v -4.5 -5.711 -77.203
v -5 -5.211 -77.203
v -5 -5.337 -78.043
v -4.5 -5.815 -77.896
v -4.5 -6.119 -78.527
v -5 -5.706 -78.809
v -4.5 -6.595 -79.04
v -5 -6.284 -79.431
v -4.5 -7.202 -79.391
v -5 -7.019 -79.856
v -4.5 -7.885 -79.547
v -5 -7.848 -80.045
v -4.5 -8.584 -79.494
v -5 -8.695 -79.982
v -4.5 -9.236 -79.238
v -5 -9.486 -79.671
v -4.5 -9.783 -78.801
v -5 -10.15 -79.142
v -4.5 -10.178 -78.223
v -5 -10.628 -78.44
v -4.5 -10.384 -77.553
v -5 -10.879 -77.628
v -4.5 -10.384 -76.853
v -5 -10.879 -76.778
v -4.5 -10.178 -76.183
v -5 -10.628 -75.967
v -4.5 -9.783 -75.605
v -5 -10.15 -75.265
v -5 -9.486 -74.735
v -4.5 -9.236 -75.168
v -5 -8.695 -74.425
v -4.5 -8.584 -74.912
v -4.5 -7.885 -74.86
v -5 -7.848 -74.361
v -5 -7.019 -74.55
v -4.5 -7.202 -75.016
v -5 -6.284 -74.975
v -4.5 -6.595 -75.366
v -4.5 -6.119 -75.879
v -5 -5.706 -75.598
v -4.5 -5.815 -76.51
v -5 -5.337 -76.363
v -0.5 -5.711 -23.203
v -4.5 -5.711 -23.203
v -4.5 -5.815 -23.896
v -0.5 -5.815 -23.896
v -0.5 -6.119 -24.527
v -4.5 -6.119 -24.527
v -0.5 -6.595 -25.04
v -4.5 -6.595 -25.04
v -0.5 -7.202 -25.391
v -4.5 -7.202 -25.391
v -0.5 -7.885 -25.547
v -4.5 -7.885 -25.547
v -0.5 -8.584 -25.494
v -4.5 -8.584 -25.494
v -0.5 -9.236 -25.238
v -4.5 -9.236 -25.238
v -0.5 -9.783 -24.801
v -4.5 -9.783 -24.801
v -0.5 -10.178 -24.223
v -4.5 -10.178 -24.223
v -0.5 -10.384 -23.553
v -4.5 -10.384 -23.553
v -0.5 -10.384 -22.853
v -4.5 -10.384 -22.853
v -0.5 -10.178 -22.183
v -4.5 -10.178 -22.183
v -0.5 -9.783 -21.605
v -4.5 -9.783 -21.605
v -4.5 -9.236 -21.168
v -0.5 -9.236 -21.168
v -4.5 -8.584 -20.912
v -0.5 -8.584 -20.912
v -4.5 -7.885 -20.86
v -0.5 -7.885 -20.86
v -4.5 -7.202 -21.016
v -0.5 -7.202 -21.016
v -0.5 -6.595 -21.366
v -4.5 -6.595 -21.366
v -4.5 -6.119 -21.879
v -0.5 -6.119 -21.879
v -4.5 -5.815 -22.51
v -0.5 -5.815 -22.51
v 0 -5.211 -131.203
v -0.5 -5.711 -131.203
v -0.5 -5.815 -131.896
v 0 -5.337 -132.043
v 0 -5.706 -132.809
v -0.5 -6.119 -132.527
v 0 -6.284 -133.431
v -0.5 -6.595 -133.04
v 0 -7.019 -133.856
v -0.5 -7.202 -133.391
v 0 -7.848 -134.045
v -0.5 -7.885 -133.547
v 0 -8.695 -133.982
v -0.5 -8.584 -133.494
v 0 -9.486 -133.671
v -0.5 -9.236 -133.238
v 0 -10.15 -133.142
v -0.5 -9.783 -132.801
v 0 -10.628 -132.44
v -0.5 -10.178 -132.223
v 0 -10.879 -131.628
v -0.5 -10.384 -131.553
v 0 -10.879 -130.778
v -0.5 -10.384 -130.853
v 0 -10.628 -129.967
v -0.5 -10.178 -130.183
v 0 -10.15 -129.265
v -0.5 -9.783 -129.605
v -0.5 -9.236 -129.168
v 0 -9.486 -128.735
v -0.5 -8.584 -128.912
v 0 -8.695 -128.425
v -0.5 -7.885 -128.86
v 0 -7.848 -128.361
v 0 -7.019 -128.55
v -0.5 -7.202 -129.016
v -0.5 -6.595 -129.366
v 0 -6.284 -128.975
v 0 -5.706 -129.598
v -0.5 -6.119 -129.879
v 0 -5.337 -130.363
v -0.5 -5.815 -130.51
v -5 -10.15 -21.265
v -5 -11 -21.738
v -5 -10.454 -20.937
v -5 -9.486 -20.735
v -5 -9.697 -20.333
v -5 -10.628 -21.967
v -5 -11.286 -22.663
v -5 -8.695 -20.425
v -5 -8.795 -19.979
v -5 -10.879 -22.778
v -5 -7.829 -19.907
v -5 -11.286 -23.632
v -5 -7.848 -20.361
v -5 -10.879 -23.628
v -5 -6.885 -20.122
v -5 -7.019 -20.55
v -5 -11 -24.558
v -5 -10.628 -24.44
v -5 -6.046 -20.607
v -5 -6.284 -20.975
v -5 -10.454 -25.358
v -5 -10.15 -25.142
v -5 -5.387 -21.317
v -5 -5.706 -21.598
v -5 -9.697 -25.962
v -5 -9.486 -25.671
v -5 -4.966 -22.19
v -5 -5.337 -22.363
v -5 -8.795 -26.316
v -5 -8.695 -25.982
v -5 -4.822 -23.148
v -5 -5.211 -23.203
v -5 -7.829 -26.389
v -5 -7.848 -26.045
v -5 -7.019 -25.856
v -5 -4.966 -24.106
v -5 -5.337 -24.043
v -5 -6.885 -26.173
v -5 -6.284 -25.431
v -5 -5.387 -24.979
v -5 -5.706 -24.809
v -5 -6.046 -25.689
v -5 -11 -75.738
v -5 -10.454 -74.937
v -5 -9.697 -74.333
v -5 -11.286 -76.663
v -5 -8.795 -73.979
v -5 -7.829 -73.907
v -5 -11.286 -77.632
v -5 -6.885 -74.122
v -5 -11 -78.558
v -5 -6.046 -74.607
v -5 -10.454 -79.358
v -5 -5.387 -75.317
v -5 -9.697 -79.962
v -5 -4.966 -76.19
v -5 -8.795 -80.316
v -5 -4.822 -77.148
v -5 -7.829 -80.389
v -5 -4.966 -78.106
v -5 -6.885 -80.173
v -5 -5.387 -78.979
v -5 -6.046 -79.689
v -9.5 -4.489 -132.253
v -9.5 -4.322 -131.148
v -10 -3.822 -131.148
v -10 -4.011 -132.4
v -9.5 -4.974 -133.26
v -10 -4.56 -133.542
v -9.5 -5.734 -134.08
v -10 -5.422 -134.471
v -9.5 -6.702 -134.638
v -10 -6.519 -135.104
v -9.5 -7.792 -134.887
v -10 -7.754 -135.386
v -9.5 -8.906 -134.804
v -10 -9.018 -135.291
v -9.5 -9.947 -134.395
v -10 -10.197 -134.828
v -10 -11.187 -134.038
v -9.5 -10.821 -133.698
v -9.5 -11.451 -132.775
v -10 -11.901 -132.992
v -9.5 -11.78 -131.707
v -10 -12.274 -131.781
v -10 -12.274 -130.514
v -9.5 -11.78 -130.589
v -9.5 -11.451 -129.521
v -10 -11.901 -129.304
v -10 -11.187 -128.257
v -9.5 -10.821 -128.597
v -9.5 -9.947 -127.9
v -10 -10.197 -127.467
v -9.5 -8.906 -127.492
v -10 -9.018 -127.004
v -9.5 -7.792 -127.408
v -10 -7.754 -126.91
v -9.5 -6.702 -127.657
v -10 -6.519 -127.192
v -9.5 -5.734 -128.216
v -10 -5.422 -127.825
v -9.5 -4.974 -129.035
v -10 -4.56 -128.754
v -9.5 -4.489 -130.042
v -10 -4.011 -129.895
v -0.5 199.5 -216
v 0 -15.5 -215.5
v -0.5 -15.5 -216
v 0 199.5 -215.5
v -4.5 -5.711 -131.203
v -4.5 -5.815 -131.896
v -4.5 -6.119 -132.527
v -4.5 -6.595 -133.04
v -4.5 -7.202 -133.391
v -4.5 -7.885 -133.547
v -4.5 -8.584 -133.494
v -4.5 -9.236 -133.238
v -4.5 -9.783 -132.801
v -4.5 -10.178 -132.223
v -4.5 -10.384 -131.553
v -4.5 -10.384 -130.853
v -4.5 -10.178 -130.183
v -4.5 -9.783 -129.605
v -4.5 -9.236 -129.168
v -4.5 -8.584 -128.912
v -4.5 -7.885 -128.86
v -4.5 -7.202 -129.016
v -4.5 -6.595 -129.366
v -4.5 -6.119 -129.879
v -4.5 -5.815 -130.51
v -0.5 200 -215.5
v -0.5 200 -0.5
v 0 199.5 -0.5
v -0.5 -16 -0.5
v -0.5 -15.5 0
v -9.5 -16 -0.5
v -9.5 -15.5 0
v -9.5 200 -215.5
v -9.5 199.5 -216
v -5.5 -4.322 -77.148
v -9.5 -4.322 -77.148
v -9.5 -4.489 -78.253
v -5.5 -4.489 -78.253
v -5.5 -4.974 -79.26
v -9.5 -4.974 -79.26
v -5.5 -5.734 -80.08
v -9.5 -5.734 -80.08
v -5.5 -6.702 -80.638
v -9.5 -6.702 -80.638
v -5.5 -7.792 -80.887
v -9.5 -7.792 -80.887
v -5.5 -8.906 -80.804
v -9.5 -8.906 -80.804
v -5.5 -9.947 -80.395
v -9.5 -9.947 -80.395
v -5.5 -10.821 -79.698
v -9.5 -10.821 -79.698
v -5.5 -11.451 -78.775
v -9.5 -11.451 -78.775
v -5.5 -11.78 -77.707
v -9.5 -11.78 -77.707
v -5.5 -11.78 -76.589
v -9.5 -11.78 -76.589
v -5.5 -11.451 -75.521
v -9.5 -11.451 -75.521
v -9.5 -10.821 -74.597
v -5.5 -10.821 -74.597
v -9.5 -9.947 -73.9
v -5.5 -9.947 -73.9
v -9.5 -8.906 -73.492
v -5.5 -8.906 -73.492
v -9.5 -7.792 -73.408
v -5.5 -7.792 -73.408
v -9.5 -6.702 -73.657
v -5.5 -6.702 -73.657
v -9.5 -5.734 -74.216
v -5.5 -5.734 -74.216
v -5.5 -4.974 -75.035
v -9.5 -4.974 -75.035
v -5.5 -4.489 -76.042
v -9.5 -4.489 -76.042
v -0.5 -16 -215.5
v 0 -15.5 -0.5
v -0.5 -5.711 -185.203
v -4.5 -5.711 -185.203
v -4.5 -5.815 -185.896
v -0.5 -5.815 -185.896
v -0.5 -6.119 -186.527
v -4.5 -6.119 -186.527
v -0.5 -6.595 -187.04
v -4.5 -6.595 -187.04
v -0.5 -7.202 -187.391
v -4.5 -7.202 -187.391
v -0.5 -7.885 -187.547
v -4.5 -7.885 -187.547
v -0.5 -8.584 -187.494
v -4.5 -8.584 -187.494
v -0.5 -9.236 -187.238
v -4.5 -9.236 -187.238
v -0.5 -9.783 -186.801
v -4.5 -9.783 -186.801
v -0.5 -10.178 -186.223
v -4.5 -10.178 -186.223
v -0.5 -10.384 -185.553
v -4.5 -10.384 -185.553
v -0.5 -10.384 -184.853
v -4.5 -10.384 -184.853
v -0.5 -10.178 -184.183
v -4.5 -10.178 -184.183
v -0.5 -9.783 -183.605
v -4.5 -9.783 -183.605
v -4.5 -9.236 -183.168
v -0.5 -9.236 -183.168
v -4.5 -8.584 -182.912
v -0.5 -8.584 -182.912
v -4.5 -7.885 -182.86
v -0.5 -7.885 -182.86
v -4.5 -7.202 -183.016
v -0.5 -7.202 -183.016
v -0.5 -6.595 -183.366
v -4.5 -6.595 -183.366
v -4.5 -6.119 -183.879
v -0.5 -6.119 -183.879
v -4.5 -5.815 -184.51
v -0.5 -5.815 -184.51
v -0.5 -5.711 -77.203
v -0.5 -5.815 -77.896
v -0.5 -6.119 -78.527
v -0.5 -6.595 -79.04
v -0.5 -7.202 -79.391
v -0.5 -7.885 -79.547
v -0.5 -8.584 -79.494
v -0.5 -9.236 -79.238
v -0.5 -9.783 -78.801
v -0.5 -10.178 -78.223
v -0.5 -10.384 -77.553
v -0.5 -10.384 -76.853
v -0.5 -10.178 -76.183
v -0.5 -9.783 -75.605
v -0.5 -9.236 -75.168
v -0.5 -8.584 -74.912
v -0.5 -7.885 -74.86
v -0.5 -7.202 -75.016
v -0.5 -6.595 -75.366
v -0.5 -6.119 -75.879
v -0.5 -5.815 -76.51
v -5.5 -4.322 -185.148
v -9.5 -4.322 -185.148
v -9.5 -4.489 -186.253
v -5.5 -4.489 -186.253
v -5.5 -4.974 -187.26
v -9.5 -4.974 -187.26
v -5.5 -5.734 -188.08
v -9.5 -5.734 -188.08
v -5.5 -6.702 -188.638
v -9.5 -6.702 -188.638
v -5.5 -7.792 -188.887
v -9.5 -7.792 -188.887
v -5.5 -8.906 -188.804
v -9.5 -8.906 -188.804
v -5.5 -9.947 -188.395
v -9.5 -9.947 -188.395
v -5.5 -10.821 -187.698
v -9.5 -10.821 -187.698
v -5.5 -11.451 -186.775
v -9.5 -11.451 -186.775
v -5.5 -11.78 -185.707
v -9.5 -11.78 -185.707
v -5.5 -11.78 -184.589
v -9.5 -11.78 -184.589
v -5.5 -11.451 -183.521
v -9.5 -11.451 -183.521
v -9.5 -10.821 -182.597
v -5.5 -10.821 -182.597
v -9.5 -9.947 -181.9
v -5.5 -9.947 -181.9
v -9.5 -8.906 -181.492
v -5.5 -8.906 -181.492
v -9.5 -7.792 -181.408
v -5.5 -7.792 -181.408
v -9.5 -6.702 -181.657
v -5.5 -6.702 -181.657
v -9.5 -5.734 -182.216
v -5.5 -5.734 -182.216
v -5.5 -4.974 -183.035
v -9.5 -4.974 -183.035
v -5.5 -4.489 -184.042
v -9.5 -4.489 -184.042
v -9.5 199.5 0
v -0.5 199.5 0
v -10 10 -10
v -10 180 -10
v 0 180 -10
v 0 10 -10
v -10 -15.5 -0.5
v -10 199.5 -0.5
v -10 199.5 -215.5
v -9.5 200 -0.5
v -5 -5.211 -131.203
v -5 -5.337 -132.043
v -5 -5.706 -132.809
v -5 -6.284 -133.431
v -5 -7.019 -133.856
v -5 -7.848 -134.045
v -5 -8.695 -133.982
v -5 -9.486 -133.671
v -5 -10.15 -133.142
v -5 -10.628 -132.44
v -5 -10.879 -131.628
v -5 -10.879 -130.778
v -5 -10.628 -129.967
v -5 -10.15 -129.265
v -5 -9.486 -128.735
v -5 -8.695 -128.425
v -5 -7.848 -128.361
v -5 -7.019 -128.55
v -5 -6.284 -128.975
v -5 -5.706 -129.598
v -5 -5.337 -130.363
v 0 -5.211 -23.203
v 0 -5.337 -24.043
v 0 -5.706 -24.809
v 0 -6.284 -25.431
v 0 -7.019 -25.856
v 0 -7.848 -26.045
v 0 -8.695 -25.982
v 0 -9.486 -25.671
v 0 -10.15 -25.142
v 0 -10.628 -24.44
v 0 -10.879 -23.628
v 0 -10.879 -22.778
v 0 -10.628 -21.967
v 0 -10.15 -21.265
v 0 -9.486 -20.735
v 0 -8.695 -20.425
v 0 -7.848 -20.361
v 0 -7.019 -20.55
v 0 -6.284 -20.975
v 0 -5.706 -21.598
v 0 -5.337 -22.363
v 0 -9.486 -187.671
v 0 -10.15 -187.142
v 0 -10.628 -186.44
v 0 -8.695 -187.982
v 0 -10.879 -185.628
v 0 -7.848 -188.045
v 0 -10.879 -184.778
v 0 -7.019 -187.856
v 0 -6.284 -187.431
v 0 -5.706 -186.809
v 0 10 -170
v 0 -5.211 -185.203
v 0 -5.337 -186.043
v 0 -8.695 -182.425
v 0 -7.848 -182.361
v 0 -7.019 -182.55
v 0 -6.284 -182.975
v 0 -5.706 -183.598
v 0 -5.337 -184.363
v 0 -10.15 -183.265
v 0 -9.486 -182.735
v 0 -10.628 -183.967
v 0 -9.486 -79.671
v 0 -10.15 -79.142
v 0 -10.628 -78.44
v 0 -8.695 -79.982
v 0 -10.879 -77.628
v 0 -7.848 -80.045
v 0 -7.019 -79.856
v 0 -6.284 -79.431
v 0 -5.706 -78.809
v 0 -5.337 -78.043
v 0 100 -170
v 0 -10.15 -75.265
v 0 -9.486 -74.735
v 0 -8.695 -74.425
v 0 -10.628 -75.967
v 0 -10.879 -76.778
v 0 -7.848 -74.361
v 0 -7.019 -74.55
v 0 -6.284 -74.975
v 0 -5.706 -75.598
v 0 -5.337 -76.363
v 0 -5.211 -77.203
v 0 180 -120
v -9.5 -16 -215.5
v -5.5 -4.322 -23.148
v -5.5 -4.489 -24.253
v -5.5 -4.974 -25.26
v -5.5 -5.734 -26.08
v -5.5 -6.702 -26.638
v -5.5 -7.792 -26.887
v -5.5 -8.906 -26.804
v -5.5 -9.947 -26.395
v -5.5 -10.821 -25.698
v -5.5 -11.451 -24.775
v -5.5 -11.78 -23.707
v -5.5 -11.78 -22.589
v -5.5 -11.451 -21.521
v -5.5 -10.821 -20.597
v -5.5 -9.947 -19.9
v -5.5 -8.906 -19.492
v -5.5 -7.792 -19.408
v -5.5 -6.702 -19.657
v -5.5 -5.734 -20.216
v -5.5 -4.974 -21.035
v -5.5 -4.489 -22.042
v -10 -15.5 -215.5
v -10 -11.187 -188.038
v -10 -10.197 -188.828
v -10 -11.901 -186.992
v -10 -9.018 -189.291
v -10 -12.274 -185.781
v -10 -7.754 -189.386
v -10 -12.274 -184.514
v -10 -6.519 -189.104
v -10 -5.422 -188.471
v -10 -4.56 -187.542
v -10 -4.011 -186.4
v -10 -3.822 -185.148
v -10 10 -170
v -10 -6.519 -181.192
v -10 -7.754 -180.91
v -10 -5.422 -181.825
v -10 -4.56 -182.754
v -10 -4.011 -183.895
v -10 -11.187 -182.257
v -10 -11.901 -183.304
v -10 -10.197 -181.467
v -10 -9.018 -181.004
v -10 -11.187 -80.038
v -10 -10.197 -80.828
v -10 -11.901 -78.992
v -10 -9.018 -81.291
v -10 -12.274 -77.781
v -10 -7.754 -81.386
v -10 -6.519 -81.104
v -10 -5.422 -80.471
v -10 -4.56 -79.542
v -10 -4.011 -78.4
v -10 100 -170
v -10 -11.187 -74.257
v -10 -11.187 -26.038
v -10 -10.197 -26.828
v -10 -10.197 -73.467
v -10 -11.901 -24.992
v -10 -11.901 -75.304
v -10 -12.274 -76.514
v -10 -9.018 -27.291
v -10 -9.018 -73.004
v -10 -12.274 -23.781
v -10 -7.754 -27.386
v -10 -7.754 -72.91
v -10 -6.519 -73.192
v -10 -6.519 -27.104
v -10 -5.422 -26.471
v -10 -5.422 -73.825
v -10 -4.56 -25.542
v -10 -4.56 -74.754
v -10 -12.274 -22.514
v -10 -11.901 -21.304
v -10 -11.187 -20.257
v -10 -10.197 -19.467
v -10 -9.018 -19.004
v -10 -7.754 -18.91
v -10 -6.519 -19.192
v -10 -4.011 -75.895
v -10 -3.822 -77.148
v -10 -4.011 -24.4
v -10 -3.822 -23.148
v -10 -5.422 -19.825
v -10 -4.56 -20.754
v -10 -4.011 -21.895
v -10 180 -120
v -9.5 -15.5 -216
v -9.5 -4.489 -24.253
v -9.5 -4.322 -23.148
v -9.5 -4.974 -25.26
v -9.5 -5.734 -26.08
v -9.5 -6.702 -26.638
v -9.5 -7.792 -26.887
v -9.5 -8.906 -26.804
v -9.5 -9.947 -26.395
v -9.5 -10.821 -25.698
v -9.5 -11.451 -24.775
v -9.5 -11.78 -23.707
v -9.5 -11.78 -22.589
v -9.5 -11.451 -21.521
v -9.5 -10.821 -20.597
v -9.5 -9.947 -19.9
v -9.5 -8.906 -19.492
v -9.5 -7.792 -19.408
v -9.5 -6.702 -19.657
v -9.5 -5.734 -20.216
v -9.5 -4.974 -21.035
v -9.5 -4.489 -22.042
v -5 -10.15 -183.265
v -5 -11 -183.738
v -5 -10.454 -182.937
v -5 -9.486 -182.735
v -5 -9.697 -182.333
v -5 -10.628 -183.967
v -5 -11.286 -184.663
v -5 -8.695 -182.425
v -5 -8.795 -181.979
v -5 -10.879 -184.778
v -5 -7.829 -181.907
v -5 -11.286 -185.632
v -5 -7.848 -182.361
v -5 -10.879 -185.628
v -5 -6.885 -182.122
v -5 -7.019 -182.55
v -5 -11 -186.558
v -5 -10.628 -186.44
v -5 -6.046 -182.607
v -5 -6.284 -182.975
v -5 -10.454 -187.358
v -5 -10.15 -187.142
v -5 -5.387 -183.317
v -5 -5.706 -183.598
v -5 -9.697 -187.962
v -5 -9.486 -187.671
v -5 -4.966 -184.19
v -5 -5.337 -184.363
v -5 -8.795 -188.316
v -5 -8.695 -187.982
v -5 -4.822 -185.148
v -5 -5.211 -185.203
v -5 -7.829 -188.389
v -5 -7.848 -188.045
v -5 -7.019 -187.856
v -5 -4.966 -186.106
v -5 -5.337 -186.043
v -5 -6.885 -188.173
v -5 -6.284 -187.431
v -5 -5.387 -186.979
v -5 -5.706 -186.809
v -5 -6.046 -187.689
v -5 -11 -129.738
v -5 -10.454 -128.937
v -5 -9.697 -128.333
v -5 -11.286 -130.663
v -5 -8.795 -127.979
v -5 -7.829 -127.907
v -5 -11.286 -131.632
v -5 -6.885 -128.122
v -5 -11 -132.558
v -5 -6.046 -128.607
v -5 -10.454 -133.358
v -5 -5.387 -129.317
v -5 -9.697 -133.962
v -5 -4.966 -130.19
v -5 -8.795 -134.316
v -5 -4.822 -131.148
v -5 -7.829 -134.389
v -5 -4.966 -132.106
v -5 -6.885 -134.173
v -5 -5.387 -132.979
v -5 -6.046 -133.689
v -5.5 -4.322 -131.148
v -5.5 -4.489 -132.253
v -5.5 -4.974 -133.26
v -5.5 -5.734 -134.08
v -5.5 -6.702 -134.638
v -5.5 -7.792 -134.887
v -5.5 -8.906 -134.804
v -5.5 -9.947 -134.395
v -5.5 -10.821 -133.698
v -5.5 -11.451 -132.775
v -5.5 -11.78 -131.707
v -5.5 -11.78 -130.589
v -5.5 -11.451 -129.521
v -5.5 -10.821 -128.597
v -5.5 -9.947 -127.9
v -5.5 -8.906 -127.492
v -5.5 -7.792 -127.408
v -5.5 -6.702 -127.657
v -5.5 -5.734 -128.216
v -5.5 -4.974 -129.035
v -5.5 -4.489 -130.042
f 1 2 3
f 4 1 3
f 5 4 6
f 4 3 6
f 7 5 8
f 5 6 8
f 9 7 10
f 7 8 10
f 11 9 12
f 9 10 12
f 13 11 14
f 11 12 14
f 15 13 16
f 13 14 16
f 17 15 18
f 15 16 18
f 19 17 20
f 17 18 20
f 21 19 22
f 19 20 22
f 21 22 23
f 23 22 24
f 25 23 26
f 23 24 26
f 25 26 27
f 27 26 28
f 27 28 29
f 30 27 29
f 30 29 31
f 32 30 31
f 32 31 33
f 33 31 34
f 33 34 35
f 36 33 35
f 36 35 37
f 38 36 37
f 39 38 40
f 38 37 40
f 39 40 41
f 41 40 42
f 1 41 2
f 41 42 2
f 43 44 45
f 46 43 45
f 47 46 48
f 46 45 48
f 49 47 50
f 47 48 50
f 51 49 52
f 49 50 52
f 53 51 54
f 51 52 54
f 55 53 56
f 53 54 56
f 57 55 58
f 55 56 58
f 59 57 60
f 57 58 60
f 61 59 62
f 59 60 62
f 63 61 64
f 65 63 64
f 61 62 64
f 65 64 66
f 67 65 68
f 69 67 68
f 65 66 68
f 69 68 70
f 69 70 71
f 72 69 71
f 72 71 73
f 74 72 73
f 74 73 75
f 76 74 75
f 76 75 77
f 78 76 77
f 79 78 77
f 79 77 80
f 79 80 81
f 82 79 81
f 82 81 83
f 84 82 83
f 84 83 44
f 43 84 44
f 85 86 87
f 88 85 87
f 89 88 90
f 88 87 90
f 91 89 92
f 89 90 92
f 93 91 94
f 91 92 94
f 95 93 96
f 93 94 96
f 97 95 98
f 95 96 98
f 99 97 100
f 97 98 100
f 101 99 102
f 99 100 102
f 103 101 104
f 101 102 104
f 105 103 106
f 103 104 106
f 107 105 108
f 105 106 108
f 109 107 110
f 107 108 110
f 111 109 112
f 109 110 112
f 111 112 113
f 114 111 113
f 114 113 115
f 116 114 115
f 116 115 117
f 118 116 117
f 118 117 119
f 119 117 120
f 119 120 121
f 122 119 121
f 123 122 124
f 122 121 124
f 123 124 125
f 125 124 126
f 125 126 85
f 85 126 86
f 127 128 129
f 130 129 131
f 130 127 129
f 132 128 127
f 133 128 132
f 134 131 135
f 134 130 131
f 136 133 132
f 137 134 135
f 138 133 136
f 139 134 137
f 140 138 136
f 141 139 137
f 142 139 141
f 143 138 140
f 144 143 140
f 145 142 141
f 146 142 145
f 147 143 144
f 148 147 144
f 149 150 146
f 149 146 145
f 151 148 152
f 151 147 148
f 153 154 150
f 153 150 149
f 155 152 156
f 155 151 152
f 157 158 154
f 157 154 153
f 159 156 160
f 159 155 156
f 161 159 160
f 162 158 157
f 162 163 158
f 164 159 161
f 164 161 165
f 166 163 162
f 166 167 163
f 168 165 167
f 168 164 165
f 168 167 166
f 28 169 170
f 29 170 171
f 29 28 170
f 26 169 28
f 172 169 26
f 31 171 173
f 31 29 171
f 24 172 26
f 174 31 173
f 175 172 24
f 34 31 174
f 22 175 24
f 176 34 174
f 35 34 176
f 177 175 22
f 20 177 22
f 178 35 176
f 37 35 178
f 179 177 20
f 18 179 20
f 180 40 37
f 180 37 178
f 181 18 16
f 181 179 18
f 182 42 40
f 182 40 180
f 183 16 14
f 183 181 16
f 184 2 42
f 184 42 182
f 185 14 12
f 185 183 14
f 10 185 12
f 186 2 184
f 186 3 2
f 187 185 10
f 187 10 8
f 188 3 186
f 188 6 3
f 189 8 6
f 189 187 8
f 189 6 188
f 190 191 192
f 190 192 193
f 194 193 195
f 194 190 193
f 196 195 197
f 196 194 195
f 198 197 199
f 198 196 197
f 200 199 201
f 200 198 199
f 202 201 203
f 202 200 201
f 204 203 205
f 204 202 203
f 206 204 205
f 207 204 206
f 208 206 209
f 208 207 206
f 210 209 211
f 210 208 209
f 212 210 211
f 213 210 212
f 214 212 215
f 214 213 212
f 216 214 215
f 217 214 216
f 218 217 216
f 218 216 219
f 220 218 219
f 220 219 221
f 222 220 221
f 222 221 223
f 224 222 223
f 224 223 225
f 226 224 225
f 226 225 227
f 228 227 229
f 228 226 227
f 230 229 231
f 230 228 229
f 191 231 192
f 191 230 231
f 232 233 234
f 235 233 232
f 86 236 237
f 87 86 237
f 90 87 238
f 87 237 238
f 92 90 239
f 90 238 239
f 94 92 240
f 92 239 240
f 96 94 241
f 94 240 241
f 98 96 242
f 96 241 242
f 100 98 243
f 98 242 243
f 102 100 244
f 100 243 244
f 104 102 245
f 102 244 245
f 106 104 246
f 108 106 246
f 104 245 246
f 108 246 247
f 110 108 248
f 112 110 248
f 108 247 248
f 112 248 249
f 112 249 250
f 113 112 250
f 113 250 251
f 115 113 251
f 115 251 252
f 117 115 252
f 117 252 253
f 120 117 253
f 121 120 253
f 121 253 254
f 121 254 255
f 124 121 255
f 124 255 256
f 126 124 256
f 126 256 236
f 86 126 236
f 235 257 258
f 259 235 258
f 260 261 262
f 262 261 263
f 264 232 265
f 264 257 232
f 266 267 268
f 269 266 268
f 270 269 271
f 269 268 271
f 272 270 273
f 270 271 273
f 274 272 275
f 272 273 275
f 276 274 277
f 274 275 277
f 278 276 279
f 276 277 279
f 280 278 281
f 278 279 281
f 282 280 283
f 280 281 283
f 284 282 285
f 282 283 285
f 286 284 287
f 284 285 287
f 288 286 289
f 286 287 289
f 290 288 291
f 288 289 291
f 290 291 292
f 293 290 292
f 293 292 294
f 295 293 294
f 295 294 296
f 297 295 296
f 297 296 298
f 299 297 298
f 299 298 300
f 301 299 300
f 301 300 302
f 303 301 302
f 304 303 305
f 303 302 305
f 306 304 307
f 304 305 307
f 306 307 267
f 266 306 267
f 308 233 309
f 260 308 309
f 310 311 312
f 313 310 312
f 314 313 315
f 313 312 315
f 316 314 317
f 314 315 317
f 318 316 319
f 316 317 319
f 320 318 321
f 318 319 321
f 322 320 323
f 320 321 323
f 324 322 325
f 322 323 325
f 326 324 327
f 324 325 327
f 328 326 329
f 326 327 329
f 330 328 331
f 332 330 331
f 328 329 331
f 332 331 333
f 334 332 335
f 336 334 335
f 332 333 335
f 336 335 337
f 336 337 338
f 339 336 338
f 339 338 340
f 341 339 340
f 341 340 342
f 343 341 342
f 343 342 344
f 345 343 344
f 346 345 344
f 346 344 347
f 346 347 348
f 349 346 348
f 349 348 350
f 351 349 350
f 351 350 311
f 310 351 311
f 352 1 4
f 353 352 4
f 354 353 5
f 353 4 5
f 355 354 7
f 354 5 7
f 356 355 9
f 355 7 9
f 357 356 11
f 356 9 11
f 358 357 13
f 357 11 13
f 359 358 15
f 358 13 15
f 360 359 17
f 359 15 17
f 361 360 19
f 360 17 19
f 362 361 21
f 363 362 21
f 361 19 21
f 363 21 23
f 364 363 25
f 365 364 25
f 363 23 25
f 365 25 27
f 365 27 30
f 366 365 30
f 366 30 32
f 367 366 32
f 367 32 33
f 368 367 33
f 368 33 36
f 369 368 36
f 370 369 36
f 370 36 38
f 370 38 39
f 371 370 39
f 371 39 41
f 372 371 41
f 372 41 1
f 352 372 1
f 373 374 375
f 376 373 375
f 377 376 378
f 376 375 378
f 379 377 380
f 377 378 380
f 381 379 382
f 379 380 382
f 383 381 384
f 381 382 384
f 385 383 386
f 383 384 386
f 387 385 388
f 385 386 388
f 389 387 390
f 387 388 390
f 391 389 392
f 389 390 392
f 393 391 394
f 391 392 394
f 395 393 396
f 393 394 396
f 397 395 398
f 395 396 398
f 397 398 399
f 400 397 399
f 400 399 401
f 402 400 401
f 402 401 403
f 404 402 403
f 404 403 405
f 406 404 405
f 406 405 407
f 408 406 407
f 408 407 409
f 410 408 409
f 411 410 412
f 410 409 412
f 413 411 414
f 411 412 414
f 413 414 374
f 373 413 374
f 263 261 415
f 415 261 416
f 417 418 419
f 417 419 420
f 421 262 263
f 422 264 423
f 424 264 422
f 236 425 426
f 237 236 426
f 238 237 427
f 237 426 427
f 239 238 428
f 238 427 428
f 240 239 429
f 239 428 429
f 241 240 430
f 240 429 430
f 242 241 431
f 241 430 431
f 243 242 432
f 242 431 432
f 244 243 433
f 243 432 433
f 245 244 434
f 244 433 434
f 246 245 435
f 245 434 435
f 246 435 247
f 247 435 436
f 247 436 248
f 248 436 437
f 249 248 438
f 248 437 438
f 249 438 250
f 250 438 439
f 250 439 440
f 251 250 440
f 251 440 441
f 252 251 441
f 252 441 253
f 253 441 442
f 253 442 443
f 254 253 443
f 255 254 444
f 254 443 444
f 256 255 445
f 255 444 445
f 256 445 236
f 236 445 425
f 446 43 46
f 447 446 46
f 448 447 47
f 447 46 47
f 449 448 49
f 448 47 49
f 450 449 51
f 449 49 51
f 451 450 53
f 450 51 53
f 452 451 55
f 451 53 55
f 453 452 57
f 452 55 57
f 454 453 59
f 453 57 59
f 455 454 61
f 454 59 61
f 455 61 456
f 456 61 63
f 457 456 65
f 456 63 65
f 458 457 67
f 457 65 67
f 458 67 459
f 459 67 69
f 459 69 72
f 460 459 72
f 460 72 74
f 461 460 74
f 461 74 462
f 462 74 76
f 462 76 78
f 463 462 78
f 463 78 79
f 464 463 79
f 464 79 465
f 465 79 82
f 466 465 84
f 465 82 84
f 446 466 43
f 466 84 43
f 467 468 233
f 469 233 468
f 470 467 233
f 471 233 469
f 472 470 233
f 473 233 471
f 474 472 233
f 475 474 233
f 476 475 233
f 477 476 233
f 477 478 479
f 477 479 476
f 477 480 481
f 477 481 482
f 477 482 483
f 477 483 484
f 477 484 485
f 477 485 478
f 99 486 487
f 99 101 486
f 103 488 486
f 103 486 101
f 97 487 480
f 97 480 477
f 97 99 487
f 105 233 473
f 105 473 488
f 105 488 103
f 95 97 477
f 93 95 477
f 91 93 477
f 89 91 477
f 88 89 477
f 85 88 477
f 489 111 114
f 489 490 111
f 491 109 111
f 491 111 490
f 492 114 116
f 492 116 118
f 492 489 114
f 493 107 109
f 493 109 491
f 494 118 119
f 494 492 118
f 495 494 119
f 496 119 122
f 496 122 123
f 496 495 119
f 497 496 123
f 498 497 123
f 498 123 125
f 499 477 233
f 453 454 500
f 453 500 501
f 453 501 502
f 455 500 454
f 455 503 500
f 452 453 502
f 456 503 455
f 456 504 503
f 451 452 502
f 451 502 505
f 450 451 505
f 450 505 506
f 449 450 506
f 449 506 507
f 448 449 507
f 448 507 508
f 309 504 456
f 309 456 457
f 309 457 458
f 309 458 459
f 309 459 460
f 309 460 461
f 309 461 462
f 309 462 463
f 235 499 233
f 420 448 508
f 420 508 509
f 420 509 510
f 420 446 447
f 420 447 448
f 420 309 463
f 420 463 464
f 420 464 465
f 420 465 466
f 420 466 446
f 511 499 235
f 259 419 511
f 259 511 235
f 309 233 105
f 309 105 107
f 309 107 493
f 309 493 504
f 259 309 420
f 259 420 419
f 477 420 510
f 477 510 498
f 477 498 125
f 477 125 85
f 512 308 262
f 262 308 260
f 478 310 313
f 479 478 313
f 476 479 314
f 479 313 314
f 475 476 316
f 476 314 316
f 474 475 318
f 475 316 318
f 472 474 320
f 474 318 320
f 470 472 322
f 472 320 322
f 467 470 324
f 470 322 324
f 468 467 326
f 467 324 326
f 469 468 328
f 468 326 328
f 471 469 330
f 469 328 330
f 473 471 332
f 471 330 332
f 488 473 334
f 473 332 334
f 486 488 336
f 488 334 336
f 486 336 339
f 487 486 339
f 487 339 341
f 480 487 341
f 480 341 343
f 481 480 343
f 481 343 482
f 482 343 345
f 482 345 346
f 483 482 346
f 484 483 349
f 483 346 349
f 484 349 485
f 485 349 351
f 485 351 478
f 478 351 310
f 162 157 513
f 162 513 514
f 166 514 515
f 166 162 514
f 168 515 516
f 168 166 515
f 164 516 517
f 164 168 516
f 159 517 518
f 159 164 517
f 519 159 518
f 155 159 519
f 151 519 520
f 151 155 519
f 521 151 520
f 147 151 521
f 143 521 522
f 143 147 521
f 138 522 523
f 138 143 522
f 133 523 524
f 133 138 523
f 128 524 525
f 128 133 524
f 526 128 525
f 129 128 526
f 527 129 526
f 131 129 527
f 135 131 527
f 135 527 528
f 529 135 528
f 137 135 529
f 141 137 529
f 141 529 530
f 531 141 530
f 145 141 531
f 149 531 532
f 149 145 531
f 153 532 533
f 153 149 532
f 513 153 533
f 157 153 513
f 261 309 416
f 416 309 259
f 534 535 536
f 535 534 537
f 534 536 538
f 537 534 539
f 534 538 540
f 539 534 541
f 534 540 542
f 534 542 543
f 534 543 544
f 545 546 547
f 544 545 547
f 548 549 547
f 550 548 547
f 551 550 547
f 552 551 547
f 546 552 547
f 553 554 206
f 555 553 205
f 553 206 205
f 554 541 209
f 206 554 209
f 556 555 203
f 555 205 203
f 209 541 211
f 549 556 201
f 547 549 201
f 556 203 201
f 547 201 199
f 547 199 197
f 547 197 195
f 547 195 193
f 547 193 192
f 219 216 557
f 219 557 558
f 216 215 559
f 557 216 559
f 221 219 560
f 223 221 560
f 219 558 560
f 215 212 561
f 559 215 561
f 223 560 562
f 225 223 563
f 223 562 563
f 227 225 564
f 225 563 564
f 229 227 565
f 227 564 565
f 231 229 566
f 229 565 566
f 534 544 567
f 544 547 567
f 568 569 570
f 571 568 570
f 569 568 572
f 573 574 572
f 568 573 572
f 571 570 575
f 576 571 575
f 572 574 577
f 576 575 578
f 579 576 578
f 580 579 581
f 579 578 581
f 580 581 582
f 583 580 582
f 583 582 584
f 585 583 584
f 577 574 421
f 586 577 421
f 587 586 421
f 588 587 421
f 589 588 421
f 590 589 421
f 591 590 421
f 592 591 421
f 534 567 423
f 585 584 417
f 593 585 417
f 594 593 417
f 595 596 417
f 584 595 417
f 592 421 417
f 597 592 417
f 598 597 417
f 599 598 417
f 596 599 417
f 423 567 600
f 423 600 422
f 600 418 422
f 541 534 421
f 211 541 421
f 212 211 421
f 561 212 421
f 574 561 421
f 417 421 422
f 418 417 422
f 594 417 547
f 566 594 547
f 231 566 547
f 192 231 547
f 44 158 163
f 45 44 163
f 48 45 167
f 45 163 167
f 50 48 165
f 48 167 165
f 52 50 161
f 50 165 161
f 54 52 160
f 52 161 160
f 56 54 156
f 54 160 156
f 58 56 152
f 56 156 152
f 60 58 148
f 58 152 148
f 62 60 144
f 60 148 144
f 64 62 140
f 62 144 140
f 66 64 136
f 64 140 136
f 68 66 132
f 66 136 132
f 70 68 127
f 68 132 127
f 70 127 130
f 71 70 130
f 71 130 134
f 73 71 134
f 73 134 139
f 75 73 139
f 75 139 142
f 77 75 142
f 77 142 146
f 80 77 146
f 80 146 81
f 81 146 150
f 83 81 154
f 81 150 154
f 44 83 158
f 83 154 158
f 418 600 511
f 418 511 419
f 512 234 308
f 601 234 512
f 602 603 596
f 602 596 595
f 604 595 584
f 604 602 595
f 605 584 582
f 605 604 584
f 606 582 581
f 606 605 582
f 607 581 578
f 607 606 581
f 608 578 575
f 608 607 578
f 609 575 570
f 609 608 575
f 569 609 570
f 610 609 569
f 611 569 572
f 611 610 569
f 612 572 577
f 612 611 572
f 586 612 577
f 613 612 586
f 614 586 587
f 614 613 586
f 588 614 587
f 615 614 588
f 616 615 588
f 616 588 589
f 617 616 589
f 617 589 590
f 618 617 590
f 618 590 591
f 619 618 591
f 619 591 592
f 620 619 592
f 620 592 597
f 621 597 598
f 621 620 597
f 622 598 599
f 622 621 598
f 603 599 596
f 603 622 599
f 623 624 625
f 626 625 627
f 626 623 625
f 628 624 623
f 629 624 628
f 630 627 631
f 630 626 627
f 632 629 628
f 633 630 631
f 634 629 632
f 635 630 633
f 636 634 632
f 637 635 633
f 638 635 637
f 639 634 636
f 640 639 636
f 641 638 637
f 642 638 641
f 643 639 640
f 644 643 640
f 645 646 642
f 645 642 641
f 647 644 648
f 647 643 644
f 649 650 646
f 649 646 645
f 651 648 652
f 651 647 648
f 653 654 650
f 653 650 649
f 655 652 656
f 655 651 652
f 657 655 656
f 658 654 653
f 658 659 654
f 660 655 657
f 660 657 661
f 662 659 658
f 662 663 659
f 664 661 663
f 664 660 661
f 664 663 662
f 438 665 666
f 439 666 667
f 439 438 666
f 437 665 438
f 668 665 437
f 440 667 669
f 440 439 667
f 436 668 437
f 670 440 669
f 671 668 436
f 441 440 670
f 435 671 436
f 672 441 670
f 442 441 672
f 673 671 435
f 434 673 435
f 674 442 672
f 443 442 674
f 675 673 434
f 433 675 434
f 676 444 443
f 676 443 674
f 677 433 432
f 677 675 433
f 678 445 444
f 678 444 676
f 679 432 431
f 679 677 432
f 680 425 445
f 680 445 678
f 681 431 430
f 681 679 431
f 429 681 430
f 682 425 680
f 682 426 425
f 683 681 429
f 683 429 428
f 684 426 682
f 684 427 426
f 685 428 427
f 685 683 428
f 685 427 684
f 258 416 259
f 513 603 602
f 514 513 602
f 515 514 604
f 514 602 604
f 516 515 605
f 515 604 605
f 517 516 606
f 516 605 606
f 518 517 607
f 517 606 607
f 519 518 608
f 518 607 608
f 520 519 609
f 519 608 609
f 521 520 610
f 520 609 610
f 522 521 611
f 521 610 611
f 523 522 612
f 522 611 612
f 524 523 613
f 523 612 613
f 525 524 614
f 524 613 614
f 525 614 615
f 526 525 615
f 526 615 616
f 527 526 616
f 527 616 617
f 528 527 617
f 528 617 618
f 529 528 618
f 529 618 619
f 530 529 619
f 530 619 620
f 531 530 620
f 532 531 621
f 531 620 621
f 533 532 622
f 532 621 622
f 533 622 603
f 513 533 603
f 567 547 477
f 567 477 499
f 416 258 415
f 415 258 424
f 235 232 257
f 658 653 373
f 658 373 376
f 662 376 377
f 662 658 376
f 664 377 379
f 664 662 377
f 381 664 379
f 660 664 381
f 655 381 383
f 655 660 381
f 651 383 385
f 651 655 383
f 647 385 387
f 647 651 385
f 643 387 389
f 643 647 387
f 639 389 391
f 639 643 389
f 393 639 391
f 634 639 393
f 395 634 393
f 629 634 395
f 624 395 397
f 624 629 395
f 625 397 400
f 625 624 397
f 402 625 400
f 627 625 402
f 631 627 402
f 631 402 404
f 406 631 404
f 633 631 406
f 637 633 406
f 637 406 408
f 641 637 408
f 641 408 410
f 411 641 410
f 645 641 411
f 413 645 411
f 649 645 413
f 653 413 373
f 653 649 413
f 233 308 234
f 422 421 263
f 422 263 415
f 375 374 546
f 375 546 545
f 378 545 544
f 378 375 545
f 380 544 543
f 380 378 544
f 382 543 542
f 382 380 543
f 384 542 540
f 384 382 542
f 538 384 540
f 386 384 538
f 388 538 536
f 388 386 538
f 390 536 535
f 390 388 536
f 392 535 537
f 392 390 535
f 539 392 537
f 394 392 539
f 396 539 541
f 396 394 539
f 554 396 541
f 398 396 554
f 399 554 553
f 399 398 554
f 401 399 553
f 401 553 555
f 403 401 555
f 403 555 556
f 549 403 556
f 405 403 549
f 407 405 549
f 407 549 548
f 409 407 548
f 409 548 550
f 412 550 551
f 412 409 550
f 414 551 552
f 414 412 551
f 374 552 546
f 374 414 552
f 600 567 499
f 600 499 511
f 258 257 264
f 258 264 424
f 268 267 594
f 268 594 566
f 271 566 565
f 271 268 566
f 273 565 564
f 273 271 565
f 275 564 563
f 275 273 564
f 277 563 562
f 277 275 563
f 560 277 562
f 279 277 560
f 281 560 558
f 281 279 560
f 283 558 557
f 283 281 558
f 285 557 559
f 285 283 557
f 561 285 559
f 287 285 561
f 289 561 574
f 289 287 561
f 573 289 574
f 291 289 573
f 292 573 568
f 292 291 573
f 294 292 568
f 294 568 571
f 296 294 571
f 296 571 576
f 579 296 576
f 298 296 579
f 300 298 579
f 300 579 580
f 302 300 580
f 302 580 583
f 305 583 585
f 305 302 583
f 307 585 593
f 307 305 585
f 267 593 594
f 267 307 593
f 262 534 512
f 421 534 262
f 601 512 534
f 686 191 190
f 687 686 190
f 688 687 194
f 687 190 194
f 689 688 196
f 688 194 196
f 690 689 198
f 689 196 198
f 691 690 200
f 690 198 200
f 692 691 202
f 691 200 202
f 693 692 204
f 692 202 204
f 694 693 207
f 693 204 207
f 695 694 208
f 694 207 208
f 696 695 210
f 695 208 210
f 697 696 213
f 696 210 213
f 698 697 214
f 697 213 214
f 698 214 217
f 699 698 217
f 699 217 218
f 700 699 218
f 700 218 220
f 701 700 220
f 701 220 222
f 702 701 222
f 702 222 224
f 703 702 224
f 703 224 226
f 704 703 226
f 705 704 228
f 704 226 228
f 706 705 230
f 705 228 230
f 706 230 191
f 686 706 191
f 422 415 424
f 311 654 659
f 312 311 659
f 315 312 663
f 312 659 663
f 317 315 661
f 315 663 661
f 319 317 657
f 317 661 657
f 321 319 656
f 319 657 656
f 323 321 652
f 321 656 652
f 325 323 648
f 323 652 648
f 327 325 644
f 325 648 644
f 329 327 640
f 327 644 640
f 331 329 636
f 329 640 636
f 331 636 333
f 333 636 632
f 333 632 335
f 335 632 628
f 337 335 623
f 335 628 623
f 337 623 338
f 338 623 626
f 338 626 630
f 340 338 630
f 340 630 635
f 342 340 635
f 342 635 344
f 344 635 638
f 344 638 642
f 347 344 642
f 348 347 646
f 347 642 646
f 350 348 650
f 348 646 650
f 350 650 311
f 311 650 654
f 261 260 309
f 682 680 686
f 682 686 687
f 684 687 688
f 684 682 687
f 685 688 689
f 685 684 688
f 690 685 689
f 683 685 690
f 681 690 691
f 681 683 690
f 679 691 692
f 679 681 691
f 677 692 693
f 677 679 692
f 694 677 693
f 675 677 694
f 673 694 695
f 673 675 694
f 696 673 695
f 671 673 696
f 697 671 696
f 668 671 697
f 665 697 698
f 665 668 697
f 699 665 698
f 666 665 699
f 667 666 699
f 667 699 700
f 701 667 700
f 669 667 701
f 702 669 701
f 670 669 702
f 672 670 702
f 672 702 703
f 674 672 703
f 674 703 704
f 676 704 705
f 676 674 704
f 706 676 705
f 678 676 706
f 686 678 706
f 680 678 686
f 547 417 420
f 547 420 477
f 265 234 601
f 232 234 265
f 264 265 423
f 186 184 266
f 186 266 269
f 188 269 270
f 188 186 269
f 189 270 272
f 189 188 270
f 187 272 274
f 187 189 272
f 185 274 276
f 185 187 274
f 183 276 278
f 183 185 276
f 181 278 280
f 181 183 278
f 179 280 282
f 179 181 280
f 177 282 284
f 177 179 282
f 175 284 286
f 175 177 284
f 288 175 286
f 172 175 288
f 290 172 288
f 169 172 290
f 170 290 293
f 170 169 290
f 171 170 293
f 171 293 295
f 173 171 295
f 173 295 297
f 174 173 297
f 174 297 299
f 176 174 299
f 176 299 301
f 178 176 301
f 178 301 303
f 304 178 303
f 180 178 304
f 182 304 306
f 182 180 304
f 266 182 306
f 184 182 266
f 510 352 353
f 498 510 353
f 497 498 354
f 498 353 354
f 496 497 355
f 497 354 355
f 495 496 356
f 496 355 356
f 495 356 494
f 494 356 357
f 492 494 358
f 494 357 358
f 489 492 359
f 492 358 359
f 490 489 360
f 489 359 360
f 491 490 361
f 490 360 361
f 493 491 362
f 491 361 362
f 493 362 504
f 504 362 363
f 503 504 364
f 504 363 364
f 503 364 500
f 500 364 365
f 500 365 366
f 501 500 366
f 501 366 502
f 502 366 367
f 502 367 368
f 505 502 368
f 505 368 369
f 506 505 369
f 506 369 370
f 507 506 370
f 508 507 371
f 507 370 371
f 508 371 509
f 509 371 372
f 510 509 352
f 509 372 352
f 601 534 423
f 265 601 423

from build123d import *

# Parameters (mm, degrees)
SKETCH011_W     = 216
SKETCH011_H     = 216
PAD005_DEPTH    = 10
SKETCH014_R     = 2.35
POCKET008_DEPTH = 11
SKETCH015_R     = 3.75
POCKET009_DEPTH = 5
CHAMFER001_SIZE = 0.5
POCKET010_DEPTH = 10


with BuildPart() as part:
    # Sketch011 → Pad005 (new body)
    with BuildSketch(Plane.YZ):
        with Locations((92, -108)):
            Rectangle(SKETCH011_W, SKETCH011_H)
    extrude(amount=-PAD005_DEPTH)

    # Sketch014 (on Face6 of Pad005) → Pocket008 (cut)
    with BuildSketch(Plane(origin=(-10, 0, 0), x_dir=(0, 1, 0), z_dir=(-1, 0, 0))):
        with Locations((-8.060639, 185.203074)):
            Circle(SKETCH014_R)
        with Locations((-8.060639, 131.203074)):
            Circle(SKETCH014_R)
        with Locations((-8.060639, 77.203074)):
            Circle(SKETCH014_R)
        with Locations((-8.060639, 23.203074)):
            Circle(SKETCH014_R)
    extrude(amount=-POCKET008_DEPTH, mode=Mode.SUBTRACT)

    # Sketch015 (on Face5 of Pocket008) → Pocket009 (cut)
    with BuildSketch(Plane(origin=(-10, 0, 0), x_dir=(0, 1, 0), z_dir=(-1, 0, 0))):
        with Locations((-8.071904, 23.147722)):
            Circle(SKETCH015_R)
        with Locations((-8.071904, 77.147722)):
            Circle(SKETCH015_R)
        with Locations((-8.071904, 131.147722)):
            Circle(SKETCH015_R)
        with Locations((-8.071904, 185.147722)):
            Circle(SKETCH015_R)
    extrude(amount=-POCKET009_DEPTH, mode=Mode.SUBTRACT)

    # Chamfer001
    chamfer001_edges = [part.edges().sort_by_distance(p)[0] for p in [
        (-5, -16, 0),
        (-5, -16, -216),
        (0, -16, -108),
        (-10, -16, -108),
        (-5, 200, 0),
        (0, 92, 0),
        (-10, 92, 0),
        (-5, 200, -216),
        (0, 92, -216),
        (-10, 92, -216),
        (0, 200, -108),
        (0, -10.410639, -185.203074),
        (0, -10.410639, -131.203074),
        (0, -10.410639, -77.203074),
        (0, -10.410639, -23.203074),
        (-10, 200, -108),
        (-10, -11.821904, -23.147722),
        (-10, -11.821904, -185.147722),
        (-10, -11.821904, -131.147722),
        (-10, -11.821904, -77.147722),
        (-5, -10.410639, -185.203074),
        (-2.5, -5.710639, -185.203074),
        (-5, -10.410639, -131.203074),
        (-2.5, -5.710639, -131.203074),
        (-5, -10.410639, -77.203074),
        (-2.5, -5.710639, -77.203074),
        (-5, -10.410639, -23.203074),
        (-2.5, -5.710639, -23.203074),
        (-7.5, -4.321904, -23.147722),
        (-5, -11.821904, -23.147722),
        (-7.5, -4.321904, -185.147722),
        (-5, -11.821904, -185.147722),
        (-7.5, -4.321904, -131.147722),
        (-5, -11.821904, -131.147722),
        (-7.5, -4.321904, -77.147722),
        (-5, -11.821904, -77.147722),
    ]]
    chamfer(chamfer001_edges, length=CHAMFER001_SIZE)

    # Sketch016 (on Face11 of Chamfer001) → Pocket010 (cut)
    with BuildSketch(Plane(origin=(-10, 0, 0), x_dir=(0, 1, 0), z_dir=(-1, 0, 0))):
        Polygon((180, 10), (10, 10), (10, 170), (100, 170), (180, 120), align=None)
    extrude(amount=-POCKET010_DEPTH, mode=Mode.SUBTRACT)


solid = part.part
